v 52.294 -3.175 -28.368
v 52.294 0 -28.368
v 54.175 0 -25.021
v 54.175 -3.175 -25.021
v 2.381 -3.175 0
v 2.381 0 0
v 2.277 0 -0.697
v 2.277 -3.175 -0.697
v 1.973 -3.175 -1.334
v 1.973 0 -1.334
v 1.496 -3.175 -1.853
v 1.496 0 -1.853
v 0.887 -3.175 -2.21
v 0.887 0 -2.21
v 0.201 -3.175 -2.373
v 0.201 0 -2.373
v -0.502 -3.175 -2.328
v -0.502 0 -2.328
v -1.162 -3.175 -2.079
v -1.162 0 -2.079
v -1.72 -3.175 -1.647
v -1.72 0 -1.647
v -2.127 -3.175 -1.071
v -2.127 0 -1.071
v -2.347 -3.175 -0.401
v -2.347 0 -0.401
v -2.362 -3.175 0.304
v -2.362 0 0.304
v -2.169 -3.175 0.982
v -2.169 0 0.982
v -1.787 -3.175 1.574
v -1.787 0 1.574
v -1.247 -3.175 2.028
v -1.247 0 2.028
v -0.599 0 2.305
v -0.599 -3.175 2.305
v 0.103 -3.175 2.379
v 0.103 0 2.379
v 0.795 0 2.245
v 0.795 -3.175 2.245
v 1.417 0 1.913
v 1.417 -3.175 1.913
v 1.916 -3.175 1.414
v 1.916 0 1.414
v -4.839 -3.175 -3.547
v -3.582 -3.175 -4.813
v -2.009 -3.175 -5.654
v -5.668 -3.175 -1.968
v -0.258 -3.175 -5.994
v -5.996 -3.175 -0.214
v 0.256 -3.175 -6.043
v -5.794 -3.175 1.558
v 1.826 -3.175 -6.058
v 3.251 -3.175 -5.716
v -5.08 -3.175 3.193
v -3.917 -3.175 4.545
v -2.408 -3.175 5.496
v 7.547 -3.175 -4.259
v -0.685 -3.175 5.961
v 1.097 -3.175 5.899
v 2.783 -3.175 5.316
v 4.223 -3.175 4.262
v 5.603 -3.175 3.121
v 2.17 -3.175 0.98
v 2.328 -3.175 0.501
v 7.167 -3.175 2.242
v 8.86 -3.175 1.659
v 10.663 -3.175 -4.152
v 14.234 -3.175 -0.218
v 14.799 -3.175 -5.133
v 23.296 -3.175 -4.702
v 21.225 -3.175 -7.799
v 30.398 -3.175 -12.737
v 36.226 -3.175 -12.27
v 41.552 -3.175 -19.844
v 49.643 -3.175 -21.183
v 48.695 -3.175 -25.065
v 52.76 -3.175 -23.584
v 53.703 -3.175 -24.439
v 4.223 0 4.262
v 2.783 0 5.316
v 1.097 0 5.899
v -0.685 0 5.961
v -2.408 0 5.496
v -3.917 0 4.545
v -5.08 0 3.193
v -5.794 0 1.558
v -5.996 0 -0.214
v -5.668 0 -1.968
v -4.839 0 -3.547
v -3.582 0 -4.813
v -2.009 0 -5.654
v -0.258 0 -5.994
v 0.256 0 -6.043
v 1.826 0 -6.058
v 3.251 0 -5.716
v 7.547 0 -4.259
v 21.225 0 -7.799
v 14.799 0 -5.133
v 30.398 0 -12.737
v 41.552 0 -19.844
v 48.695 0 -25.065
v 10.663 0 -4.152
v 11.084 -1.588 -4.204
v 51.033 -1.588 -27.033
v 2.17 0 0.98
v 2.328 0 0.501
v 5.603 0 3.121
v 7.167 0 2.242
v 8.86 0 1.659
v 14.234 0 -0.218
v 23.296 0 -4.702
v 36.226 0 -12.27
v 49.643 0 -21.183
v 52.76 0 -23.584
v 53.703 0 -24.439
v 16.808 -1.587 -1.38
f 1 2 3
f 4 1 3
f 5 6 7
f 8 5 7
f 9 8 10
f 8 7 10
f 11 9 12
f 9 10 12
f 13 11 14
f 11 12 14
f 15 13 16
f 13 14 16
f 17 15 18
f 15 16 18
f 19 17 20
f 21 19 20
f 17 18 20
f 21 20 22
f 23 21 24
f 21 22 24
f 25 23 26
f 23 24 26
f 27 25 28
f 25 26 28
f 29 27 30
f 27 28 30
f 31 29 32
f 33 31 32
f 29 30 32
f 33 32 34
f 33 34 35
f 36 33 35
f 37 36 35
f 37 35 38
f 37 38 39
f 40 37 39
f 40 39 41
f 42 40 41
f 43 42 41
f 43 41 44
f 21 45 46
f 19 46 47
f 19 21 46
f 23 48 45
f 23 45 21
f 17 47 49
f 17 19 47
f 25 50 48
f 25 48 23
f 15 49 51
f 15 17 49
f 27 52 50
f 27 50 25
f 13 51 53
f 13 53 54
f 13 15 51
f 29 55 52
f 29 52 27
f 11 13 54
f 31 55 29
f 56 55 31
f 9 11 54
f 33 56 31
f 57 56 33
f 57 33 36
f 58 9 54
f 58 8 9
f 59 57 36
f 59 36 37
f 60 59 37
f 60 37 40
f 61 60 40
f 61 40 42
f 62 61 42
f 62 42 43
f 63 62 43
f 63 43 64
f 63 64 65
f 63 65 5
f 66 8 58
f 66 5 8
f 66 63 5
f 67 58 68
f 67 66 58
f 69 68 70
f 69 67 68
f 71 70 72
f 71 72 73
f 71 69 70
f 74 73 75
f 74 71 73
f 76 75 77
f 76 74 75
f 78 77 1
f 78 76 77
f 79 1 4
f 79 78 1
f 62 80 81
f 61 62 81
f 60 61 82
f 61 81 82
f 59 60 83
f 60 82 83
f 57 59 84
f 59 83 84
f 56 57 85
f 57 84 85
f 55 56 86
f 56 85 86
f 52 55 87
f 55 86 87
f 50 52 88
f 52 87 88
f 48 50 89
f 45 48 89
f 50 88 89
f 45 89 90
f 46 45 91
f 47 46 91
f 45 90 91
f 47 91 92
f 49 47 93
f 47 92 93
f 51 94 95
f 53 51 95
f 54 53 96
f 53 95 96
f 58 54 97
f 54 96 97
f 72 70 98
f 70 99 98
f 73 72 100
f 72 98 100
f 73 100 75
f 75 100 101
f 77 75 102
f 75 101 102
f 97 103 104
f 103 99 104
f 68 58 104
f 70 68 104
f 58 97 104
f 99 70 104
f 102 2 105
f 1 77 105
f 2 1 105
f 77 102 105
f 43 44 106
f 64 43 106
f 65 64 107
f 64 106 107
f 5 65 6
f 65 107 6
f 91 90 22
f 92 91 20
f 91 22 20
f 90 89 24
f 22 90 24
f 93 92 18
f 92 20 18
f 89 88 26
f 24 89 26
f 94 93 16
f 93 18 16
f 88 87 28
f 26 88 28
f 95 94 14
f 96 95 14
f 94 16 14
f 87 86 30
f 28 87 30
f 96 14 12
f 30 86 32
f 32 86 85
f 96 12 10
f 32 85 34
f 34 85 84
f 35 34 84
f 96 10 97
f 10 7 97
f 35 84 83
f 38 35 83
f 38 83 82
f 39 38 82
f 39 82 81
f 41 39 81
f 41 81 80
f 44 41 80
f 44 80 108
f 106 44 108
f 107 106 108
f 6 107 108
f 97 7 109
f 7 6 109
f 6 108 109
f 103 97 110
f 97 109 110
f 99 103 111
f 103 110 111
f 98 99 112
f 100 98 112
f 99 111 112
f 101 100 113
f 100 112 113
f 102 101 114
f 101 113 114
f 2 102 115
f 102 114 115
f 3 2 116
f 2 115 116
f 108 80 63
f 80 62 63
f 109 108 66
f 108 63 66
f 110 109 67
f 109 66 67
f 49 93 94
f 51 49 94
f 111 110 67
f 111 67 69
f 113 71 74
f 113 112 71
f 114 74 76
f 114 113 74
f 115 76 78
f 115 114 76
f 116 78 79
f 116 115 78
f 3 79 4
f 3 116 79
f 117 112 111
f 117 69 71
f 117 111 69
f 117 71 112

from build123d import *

# Parameters (mm, degrees)
F1_DEPTH = 3.175
F2_R     = 10
F3_R     = 5


# Not quite as in the source:
# - a length typed as a fraction of an inch, garbled in the dataset ("3 / 203.2 mm" for 3/8 in), is restored


with BuildPart() as f1:
    # F0 (on Front) → F1 (new body)
    with BuildSketch(Plane.XZ):
        with BuildLine():
            ThreePointArc((6, 0), (5.9004938384, 1.0881968861), (5.6052758457, 2.1402996738))
            ThreePointArc((5.6052758457, 2.1402996738), (-4.9417506029, 3.4028078081), (0, -6))
            ThreePointArc((0, -6), (4.2426406871, -4.2426406871), (6, 0))
        make_face()
        with BuildLine():
            ThreePointArc((1.9156814293, 1.4143960633), (2.2618651558, 0.7445250698), (2.38125, 0))
            ThreePointArc((2.38125, 0), (-2.2618651558, -0.7445250698), (1.9156814293, 1.4143960633))
        make_face(mode=Mode.SUBTRACT)
        with BuildLine():
            add(Edge.make_bspline(
                [(5.6052758457, 2.1402996738), (8.4837125149, 2.063977977), (22.7725665876, -2.7548580827), (53.0235731676, -22.747897807), (54.1747063398, -25.0206626952)],
                knots=[0.1702278507, 0.1702278507, 0.1702278507, 0.1702278507, 0.381786854, 1, 1, 1, 1], degree=3))
            ThreePointArc((5.6052758457, 2.1402996738), (5.9004938384, 1.0881968861), (6, 0))
            ThreePointArc((6, 0), (4.2426406871, -4.2426406871), (0, -6))
            add(Edge.make_bspline(
                [(0, -6), (3.8225116527, -6.7277911583), (9.1618873845, 3.4044193042), (49.9044501281, -24.856960065), (52.2936917841, -28.3679403365)],
                knots=[0, 0, 0, 0, 0.3265101528, 1, 1, 1, 1], degree=3))
            Line((52.2936917841, -28.3679403365), (54.1747063398, -25.0206626952))
        make_face()
    extrude(amount=F1_DEPTH)

    # F2
    f2_edges = [f1.edges().sort_by_distance(p)[0] for p in [
        (5.605276, -1.5875, 2.1403),
    ]]
    fillet(f2_edges, radius=F2_R)

    # F3
    f3_edges = [f1.edges().sort_by_distance(p)[0] for p in [
        (0, -1.5875, -6),
    ]]
    fillet(f3_edges, radius=F3_R)


solid = f1.part
